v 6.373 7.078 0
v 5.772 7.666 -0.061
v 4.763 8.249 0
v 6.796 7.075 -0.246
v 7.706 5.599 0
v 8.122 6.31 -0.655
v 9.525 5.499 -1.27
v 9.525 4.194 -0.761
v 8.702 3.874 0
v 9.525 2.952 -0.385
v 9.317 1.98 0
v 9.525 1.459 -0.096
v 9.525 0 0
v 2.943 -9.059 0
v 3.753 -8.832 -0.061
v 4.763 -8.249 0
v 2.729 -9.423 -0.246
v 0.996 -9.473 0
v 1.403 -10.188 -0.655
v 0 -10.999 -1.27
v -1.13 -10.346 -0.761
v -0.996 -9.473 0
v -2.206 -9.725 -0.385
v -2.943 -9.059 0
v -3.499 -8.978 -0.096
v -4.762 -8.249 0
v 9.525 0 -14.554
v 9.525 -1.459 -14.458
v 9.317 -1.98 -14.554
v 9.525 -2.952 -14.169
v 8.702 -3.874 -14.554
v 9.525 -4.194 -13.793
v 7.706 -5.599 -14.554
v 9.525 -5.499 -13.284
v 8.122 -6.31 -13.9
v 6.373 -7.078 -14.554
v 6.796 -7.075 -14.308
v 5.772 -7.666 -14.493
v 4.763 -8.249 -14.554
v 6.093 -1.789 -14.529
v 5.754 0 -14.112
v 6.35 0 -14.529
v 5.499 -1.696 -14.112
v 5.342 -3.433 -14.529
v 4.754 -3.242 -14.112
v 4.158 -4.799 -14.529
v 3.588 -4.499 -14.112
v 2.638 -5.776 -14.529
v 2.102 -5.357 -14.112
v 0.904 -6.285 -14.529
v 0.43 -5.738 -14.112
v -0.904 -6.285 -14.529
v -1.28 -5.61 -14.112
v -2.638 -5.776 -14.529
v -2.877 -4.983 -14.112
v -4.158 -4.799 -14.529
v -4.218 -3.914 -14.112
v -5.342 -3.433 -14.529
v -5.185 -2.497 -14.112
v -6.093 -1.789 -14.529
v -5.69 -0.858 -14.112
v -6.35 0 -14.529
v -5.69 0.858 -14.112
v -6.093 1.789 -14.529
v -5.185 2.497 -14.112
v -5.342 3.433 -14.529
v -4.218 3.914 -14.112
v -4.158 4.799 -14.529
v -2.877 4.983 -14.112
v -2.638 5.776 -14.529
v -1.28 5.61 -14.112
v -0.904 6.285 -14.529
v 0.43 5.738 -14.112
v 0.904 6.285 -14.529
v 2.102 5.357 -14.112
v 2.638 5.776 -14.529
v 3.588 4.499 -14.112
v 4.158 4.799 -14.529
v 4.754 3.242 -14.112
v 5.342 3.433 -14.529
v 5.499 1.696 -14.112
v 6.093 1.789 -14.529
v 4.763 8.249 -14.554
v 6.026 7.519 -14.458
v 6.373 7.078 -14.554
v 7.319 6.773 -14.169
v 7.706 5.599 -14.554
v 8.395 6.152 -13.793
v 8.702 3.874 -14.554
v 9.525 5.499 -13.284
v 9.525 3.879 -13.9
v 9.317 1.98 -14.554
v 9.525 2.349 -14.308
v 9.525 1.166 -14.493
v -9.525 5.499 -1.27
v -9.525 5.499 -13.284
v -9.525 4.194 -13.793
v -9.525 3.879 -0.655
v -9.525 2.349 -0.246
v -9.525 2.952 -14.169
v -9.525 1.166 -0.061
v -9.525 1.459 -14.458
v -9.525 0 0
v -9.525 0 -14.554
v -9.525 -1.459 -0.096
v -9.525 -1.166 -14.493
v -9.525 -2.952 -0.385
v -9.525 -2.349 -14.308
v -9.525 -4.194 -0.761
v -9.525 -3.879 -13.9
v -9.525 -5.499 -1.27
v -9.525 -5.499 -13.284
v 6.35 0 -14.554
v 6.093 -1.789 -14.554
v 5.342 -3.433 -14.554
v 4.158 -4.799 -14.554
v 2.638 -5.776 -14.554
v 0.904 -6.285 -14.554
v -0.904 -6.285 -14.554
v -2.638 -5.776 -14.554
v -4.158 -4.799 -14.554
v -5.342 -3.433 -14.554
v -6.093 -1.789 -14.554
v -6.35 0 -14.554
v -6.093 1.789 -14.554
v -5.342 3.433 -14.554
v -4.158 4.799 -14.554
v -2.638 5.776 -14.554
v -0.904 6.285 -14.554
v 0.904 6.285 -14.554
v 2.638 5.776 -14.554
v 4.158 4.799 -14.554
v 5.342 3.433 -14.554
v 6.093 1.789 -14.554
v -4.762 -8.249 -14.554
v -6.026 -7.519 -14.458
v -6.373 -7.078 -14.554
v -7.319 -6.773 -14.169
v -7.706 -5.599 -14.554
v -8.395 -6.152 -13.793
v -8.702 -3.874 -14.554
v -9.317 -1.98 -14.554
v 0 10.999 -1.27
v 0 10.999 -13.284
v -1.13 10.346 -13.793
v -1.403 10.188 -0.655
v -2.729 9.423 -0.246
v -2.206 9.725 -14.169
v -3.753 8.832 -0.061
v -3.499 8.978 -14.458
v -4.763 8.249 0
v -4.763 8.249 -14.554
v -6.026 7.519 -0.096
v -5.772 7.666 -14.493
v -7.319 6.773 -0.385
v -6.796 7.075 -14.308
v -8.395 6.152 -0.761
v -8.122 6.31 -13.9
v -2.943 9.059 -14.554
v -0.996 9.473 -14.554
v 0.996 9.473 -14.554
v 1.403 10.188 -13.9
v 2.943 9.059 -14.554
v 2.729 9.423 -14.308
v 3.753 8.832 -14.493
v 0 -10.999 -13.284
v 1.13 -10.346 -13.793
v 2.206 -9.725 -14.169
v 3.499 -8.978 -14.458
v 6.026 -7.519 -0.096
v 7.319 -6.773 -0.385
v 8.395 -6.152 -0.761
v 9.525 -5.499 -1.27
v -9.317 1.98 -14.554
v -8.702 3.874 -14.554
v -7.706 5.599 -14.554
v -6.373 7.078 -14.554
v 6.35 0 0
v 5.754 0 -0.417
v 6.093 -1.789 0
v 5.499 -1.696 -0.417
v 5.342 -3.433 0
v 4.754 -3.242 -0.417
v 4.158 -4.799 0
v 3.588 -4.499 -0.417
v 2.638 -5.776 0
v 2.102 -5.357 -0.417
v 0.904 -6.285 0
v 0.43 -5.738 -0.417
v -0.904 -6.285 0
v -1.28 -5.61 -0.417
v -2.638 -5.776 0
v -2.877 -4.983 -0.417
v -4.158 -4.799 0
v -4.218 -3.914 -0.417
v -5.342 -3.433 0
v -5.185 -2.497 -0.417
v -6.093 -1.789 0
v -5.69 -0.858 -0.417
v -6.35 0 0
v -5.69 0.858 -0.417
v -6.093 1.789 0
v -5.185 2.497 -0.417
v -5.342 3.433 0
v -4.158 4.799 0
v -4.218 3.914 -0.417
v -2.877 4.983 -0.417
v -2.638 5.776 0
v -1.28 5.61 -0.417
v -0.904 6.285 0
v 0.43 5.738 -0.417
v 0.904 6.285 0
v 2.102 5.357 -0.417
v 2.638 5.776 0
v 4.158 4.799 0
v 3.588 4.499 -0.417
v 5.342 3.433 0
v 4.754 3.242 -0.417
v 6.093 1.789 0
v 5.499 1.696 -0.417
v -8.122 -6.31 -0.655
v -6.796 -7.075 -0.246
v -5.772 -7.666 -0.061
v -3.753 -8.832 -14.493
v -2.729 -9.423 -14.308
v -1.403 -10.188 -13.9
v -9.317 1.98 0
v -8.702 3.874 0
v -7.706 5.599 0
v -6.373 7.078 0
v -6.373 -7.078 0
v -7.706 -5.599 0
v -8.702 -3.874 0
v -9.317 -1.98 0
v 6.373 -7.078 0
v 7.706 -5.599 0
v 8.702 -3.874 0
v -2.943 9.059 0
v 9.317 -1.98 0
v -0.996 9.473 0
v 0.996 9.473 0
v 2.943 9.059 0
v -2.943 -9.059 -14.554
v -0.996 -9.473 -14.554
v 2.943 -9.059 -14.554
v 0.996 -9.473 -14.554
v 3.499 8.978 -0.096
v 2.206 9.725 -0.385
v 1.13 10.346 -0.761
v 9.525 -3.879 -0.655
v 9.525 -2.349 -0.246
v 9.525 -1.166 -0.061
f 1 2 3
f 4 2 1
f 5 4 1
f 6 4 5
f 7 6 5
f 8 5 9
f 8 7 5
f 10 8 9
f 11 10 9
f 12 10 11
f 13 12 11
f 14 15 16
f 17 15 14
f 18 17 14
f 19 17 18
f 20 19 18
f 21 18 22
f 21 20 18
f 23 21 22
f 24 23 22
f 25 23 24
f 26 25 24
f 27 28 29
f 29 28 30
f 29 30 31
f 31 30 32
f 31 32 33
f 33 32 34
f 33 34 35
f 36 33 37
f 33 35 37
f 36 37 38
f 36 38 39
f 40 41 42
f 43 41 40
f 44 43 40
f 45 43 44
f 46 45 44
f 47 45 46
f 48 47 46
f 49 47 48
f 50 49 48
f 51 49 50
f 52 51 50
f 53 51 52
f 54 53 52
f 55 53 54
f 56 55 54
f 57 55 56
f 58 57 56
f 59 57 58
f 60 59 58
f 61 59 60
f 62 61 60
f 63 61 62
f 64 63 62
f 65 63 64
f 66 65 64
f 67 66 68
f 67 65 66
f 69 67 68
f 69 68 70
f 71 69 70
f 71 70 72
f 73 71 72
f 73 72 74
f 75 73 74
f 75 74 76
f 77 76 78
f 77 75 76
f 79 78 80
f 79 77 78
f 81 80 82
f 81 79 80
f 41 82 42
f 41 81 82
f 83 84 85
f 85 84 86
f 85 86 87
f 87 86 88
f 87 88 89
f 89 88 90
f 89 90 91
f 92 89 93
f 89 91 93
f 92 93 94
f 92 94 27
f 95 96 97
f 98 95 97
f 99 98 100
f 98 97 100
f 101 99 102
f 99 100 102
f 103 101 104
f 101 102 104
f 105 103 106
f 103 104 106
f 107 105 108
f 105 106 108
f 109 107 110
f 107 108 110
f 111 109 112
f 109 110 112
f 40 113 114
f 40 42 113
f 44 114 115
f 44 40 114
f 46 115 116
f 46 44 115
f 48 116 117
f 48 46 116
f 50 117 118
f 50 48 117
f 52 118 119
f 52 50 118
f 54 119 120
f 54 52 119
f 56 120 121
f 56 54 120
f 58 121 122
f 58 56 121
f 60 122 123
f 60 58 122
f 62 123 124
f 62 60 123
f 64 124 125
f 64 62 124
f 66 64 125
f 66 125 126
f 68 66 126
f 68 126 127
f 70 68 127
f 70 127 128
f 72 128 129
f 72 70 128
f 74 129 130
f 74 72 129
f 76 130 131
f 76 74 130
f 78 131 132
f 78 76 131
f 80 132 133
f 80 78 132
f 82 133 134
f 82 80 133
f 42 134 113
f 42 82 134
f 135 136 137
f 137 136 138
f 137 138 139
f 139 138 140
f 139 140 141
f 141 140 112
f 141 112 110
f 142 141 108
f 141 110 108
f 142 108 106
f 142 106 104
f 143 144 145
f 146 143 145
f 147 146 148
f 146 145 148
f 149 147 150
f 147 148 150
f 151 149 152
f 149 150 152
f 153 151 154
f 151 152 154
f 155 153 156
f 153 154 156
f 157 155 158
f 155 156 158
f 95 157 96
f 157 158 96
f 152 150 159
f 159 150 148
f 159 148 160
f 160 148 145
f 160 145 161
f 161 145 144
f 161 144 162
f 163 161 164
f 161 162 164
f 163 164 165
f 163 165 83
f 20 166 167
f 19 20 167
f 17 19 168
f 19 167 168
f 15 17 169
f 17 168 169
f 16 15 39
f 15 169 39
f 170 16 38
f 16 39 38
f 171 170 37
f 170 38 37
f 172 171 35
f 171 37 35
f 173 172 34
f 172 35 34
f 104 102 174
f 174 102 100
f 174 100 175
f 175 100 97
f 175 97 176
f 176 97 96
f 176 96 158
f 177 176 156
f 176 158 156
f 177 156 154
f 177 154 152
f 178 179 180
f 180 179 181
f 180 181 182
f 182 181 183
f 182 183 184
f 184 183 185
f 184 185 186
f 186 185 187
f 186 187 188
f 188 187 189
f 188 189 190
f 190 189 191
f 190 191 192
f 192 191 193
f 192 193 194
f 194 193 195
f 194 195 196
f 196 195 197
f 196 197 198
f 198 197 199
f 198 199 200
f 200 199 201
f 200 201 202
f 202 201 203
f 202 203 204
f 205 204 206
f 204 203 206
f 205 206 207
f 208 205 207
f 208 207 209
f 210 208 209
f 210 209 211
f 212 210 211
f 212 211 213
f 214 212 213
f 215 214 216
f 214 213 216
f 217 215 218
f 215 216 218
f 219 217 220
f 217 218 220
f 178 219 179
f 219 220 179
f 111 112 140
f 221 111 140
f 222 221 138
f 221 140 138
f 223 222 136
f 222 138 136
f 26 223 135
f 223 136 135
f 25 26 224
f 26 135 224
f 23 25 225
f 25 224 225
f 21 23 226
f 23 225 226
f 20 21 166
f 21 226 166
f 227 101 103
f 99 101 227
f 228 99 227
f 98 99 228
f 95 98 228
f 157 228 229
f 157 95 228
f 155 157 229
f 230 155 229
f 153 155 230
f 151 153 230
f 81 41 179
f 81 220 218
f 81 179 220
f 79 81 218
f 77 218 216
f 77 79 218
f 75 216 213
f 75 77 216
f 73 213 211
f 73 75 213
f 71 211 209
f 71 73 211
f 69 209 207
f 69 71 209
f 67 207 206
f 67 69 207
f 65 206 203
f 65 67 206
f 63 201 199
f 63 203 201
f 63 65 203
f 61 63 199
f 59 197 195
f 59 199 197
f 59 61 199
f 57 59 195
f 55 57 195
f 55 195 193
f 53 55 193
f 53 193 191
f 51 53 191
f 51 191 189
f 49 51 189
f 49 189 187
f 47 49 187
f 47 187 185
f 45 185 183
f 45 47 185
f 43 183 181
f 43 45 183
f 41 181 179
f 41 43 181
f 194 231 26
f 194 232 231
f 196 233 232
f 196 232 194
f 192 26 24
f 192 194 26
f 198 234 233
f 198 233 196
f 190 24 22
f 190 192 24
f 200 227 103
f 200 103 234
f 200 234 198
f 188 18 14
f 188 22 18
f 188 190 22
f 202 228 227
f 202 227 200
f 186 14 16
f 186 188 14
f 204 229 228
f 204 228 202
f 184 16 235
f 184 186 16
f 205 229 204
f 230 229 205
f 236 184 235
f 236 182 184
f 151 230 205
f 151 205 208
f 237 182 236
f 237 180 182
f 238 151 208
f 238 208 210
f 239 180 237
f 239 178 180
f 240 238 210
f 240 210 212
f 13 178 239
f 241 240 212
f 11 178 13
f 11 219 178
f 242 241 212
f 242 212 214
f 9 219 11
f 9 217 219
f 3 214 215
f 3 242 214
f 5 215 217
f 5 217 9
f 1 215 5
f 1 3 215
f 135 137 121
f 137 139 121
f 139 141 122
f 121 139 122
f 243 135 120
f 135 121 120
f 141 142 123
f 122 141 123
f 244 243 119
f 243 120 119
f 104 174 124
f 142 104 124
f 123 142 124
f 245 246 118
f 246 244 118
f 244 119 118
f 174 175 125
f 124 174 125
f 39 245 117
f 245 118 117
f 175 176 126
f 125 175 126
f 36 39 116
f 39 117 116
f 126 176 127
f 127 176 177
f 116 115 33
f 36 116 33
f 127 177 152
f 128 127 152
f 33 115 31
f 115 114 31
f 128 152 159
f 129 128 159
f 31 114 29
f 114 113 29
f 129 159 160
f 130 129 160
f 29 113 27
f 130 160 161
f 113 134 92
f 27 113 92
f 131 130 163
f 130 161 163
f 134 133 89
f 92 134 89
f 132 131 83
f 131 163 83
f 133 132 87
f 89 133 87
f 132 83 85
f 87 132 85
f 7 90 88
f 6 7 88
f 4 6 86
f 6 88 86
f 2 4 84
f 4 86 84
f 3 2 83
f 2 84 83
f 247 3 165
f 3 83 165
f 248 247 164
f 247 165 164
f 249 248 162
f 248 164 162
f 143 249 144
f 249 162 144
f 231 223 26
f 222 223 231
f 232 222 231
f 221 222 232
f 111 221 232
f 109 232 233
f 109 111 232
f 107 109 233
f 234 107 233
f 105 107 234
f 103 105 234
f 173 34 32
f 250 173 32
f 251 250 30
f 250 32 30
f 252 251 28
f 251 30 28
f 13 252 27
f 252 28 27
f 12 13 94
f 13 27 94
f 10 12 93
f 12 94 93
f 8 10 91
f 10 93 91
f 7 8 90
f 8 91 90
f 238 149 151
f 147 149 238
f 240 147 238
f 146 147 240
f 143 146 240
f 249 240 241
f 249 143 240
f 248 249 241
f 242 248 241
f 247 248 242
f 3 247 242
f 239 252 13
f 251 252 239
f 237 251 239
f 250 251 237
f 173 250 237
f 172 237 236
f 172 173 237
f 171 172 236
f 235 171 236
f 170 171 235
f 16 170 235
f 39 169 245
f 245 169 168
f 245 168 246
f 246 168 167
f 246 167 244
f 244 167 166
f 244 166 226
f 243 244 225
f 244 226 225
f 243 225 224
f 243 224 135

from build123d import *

# Parameters (mm, degrees)
THREADSCHEMATIC_START     = -14.5542
THREADSCHEMATIC_OUTLINE_R = 5.75437
THREADSCHEMATIC_DEPTH     = 14.5542


# Read off the part's stored shape, not the designer's step: ThreadSchematic
with BuildPart() as part:
    # ThreadSchematic outline → ThreadSchematic (new body)
    with BuildSketch(Plane.XY.offset(THREADSCHEMATIC_START)):
        Polygon((9.525, 5.499261314), (0, 10.998522628), (-9.525, 5.499261314), (-9.525, -5.499261314), (0, -10.998522628), (9.525, -5.499261314), align=None)
        Circle(THREADSCHEMATIC_OUTLINE_R, mode=Mode.SUBTRACT)
    extrude(amount=THREADSCHEMATIC_DEPTH)

    # Sketch3 → Double-Chamfer (revolve, cut)
    with BuildSketch(Plane(origin=(0, 0, 0), x_dir=(0, 0, -1), z_dir=(1, 0, 0))):
        Polygon((14.5542, 9.525), (13.2842, 10.998522628), (13.2842, 23.698522628), (27.2542, 23.698522628), (27.2542, 9.525), align=None)
        Polygon((1.27, 23.698522628), (-12.7, 23.698522628), (-12.7, 9.525), (0, 9.525), (1.27, 10.998522628), align=None)
    revolve(axis=Axis((0, 0, 0), (0, 0, -1)), mode=Mode.SUBTRACT)

    # EndChamferSke → EndChamfer (revolve, cut)
    with BuildSketch(Plane(origin=(0, 0, 0), x_dir=(0, 0, -1), z_dir=(1, 0, 0)), mode=Mode.PRIVATE) as endchamfer_sk:
        Polygon((14.5288, 6.35), (14.070028922, 5.694807), (14.5796, 5.694807), (14.5796, 6.35), align=None)
        Polygon((-0.0508, 6.35), (0, 6.35), (0.458771078, 5.694807), (-0.0508, 5.694807), align=None)
    revolve(endchamfer_sk.sketch.rotate(Axis((0, 0, -25.037505729), (0, 0, -1)), 90), axis=Axis((0, 0, -25.037505729), (0, 0, -1)), mode=Mode.SUBTRACT)


solid = part.part
